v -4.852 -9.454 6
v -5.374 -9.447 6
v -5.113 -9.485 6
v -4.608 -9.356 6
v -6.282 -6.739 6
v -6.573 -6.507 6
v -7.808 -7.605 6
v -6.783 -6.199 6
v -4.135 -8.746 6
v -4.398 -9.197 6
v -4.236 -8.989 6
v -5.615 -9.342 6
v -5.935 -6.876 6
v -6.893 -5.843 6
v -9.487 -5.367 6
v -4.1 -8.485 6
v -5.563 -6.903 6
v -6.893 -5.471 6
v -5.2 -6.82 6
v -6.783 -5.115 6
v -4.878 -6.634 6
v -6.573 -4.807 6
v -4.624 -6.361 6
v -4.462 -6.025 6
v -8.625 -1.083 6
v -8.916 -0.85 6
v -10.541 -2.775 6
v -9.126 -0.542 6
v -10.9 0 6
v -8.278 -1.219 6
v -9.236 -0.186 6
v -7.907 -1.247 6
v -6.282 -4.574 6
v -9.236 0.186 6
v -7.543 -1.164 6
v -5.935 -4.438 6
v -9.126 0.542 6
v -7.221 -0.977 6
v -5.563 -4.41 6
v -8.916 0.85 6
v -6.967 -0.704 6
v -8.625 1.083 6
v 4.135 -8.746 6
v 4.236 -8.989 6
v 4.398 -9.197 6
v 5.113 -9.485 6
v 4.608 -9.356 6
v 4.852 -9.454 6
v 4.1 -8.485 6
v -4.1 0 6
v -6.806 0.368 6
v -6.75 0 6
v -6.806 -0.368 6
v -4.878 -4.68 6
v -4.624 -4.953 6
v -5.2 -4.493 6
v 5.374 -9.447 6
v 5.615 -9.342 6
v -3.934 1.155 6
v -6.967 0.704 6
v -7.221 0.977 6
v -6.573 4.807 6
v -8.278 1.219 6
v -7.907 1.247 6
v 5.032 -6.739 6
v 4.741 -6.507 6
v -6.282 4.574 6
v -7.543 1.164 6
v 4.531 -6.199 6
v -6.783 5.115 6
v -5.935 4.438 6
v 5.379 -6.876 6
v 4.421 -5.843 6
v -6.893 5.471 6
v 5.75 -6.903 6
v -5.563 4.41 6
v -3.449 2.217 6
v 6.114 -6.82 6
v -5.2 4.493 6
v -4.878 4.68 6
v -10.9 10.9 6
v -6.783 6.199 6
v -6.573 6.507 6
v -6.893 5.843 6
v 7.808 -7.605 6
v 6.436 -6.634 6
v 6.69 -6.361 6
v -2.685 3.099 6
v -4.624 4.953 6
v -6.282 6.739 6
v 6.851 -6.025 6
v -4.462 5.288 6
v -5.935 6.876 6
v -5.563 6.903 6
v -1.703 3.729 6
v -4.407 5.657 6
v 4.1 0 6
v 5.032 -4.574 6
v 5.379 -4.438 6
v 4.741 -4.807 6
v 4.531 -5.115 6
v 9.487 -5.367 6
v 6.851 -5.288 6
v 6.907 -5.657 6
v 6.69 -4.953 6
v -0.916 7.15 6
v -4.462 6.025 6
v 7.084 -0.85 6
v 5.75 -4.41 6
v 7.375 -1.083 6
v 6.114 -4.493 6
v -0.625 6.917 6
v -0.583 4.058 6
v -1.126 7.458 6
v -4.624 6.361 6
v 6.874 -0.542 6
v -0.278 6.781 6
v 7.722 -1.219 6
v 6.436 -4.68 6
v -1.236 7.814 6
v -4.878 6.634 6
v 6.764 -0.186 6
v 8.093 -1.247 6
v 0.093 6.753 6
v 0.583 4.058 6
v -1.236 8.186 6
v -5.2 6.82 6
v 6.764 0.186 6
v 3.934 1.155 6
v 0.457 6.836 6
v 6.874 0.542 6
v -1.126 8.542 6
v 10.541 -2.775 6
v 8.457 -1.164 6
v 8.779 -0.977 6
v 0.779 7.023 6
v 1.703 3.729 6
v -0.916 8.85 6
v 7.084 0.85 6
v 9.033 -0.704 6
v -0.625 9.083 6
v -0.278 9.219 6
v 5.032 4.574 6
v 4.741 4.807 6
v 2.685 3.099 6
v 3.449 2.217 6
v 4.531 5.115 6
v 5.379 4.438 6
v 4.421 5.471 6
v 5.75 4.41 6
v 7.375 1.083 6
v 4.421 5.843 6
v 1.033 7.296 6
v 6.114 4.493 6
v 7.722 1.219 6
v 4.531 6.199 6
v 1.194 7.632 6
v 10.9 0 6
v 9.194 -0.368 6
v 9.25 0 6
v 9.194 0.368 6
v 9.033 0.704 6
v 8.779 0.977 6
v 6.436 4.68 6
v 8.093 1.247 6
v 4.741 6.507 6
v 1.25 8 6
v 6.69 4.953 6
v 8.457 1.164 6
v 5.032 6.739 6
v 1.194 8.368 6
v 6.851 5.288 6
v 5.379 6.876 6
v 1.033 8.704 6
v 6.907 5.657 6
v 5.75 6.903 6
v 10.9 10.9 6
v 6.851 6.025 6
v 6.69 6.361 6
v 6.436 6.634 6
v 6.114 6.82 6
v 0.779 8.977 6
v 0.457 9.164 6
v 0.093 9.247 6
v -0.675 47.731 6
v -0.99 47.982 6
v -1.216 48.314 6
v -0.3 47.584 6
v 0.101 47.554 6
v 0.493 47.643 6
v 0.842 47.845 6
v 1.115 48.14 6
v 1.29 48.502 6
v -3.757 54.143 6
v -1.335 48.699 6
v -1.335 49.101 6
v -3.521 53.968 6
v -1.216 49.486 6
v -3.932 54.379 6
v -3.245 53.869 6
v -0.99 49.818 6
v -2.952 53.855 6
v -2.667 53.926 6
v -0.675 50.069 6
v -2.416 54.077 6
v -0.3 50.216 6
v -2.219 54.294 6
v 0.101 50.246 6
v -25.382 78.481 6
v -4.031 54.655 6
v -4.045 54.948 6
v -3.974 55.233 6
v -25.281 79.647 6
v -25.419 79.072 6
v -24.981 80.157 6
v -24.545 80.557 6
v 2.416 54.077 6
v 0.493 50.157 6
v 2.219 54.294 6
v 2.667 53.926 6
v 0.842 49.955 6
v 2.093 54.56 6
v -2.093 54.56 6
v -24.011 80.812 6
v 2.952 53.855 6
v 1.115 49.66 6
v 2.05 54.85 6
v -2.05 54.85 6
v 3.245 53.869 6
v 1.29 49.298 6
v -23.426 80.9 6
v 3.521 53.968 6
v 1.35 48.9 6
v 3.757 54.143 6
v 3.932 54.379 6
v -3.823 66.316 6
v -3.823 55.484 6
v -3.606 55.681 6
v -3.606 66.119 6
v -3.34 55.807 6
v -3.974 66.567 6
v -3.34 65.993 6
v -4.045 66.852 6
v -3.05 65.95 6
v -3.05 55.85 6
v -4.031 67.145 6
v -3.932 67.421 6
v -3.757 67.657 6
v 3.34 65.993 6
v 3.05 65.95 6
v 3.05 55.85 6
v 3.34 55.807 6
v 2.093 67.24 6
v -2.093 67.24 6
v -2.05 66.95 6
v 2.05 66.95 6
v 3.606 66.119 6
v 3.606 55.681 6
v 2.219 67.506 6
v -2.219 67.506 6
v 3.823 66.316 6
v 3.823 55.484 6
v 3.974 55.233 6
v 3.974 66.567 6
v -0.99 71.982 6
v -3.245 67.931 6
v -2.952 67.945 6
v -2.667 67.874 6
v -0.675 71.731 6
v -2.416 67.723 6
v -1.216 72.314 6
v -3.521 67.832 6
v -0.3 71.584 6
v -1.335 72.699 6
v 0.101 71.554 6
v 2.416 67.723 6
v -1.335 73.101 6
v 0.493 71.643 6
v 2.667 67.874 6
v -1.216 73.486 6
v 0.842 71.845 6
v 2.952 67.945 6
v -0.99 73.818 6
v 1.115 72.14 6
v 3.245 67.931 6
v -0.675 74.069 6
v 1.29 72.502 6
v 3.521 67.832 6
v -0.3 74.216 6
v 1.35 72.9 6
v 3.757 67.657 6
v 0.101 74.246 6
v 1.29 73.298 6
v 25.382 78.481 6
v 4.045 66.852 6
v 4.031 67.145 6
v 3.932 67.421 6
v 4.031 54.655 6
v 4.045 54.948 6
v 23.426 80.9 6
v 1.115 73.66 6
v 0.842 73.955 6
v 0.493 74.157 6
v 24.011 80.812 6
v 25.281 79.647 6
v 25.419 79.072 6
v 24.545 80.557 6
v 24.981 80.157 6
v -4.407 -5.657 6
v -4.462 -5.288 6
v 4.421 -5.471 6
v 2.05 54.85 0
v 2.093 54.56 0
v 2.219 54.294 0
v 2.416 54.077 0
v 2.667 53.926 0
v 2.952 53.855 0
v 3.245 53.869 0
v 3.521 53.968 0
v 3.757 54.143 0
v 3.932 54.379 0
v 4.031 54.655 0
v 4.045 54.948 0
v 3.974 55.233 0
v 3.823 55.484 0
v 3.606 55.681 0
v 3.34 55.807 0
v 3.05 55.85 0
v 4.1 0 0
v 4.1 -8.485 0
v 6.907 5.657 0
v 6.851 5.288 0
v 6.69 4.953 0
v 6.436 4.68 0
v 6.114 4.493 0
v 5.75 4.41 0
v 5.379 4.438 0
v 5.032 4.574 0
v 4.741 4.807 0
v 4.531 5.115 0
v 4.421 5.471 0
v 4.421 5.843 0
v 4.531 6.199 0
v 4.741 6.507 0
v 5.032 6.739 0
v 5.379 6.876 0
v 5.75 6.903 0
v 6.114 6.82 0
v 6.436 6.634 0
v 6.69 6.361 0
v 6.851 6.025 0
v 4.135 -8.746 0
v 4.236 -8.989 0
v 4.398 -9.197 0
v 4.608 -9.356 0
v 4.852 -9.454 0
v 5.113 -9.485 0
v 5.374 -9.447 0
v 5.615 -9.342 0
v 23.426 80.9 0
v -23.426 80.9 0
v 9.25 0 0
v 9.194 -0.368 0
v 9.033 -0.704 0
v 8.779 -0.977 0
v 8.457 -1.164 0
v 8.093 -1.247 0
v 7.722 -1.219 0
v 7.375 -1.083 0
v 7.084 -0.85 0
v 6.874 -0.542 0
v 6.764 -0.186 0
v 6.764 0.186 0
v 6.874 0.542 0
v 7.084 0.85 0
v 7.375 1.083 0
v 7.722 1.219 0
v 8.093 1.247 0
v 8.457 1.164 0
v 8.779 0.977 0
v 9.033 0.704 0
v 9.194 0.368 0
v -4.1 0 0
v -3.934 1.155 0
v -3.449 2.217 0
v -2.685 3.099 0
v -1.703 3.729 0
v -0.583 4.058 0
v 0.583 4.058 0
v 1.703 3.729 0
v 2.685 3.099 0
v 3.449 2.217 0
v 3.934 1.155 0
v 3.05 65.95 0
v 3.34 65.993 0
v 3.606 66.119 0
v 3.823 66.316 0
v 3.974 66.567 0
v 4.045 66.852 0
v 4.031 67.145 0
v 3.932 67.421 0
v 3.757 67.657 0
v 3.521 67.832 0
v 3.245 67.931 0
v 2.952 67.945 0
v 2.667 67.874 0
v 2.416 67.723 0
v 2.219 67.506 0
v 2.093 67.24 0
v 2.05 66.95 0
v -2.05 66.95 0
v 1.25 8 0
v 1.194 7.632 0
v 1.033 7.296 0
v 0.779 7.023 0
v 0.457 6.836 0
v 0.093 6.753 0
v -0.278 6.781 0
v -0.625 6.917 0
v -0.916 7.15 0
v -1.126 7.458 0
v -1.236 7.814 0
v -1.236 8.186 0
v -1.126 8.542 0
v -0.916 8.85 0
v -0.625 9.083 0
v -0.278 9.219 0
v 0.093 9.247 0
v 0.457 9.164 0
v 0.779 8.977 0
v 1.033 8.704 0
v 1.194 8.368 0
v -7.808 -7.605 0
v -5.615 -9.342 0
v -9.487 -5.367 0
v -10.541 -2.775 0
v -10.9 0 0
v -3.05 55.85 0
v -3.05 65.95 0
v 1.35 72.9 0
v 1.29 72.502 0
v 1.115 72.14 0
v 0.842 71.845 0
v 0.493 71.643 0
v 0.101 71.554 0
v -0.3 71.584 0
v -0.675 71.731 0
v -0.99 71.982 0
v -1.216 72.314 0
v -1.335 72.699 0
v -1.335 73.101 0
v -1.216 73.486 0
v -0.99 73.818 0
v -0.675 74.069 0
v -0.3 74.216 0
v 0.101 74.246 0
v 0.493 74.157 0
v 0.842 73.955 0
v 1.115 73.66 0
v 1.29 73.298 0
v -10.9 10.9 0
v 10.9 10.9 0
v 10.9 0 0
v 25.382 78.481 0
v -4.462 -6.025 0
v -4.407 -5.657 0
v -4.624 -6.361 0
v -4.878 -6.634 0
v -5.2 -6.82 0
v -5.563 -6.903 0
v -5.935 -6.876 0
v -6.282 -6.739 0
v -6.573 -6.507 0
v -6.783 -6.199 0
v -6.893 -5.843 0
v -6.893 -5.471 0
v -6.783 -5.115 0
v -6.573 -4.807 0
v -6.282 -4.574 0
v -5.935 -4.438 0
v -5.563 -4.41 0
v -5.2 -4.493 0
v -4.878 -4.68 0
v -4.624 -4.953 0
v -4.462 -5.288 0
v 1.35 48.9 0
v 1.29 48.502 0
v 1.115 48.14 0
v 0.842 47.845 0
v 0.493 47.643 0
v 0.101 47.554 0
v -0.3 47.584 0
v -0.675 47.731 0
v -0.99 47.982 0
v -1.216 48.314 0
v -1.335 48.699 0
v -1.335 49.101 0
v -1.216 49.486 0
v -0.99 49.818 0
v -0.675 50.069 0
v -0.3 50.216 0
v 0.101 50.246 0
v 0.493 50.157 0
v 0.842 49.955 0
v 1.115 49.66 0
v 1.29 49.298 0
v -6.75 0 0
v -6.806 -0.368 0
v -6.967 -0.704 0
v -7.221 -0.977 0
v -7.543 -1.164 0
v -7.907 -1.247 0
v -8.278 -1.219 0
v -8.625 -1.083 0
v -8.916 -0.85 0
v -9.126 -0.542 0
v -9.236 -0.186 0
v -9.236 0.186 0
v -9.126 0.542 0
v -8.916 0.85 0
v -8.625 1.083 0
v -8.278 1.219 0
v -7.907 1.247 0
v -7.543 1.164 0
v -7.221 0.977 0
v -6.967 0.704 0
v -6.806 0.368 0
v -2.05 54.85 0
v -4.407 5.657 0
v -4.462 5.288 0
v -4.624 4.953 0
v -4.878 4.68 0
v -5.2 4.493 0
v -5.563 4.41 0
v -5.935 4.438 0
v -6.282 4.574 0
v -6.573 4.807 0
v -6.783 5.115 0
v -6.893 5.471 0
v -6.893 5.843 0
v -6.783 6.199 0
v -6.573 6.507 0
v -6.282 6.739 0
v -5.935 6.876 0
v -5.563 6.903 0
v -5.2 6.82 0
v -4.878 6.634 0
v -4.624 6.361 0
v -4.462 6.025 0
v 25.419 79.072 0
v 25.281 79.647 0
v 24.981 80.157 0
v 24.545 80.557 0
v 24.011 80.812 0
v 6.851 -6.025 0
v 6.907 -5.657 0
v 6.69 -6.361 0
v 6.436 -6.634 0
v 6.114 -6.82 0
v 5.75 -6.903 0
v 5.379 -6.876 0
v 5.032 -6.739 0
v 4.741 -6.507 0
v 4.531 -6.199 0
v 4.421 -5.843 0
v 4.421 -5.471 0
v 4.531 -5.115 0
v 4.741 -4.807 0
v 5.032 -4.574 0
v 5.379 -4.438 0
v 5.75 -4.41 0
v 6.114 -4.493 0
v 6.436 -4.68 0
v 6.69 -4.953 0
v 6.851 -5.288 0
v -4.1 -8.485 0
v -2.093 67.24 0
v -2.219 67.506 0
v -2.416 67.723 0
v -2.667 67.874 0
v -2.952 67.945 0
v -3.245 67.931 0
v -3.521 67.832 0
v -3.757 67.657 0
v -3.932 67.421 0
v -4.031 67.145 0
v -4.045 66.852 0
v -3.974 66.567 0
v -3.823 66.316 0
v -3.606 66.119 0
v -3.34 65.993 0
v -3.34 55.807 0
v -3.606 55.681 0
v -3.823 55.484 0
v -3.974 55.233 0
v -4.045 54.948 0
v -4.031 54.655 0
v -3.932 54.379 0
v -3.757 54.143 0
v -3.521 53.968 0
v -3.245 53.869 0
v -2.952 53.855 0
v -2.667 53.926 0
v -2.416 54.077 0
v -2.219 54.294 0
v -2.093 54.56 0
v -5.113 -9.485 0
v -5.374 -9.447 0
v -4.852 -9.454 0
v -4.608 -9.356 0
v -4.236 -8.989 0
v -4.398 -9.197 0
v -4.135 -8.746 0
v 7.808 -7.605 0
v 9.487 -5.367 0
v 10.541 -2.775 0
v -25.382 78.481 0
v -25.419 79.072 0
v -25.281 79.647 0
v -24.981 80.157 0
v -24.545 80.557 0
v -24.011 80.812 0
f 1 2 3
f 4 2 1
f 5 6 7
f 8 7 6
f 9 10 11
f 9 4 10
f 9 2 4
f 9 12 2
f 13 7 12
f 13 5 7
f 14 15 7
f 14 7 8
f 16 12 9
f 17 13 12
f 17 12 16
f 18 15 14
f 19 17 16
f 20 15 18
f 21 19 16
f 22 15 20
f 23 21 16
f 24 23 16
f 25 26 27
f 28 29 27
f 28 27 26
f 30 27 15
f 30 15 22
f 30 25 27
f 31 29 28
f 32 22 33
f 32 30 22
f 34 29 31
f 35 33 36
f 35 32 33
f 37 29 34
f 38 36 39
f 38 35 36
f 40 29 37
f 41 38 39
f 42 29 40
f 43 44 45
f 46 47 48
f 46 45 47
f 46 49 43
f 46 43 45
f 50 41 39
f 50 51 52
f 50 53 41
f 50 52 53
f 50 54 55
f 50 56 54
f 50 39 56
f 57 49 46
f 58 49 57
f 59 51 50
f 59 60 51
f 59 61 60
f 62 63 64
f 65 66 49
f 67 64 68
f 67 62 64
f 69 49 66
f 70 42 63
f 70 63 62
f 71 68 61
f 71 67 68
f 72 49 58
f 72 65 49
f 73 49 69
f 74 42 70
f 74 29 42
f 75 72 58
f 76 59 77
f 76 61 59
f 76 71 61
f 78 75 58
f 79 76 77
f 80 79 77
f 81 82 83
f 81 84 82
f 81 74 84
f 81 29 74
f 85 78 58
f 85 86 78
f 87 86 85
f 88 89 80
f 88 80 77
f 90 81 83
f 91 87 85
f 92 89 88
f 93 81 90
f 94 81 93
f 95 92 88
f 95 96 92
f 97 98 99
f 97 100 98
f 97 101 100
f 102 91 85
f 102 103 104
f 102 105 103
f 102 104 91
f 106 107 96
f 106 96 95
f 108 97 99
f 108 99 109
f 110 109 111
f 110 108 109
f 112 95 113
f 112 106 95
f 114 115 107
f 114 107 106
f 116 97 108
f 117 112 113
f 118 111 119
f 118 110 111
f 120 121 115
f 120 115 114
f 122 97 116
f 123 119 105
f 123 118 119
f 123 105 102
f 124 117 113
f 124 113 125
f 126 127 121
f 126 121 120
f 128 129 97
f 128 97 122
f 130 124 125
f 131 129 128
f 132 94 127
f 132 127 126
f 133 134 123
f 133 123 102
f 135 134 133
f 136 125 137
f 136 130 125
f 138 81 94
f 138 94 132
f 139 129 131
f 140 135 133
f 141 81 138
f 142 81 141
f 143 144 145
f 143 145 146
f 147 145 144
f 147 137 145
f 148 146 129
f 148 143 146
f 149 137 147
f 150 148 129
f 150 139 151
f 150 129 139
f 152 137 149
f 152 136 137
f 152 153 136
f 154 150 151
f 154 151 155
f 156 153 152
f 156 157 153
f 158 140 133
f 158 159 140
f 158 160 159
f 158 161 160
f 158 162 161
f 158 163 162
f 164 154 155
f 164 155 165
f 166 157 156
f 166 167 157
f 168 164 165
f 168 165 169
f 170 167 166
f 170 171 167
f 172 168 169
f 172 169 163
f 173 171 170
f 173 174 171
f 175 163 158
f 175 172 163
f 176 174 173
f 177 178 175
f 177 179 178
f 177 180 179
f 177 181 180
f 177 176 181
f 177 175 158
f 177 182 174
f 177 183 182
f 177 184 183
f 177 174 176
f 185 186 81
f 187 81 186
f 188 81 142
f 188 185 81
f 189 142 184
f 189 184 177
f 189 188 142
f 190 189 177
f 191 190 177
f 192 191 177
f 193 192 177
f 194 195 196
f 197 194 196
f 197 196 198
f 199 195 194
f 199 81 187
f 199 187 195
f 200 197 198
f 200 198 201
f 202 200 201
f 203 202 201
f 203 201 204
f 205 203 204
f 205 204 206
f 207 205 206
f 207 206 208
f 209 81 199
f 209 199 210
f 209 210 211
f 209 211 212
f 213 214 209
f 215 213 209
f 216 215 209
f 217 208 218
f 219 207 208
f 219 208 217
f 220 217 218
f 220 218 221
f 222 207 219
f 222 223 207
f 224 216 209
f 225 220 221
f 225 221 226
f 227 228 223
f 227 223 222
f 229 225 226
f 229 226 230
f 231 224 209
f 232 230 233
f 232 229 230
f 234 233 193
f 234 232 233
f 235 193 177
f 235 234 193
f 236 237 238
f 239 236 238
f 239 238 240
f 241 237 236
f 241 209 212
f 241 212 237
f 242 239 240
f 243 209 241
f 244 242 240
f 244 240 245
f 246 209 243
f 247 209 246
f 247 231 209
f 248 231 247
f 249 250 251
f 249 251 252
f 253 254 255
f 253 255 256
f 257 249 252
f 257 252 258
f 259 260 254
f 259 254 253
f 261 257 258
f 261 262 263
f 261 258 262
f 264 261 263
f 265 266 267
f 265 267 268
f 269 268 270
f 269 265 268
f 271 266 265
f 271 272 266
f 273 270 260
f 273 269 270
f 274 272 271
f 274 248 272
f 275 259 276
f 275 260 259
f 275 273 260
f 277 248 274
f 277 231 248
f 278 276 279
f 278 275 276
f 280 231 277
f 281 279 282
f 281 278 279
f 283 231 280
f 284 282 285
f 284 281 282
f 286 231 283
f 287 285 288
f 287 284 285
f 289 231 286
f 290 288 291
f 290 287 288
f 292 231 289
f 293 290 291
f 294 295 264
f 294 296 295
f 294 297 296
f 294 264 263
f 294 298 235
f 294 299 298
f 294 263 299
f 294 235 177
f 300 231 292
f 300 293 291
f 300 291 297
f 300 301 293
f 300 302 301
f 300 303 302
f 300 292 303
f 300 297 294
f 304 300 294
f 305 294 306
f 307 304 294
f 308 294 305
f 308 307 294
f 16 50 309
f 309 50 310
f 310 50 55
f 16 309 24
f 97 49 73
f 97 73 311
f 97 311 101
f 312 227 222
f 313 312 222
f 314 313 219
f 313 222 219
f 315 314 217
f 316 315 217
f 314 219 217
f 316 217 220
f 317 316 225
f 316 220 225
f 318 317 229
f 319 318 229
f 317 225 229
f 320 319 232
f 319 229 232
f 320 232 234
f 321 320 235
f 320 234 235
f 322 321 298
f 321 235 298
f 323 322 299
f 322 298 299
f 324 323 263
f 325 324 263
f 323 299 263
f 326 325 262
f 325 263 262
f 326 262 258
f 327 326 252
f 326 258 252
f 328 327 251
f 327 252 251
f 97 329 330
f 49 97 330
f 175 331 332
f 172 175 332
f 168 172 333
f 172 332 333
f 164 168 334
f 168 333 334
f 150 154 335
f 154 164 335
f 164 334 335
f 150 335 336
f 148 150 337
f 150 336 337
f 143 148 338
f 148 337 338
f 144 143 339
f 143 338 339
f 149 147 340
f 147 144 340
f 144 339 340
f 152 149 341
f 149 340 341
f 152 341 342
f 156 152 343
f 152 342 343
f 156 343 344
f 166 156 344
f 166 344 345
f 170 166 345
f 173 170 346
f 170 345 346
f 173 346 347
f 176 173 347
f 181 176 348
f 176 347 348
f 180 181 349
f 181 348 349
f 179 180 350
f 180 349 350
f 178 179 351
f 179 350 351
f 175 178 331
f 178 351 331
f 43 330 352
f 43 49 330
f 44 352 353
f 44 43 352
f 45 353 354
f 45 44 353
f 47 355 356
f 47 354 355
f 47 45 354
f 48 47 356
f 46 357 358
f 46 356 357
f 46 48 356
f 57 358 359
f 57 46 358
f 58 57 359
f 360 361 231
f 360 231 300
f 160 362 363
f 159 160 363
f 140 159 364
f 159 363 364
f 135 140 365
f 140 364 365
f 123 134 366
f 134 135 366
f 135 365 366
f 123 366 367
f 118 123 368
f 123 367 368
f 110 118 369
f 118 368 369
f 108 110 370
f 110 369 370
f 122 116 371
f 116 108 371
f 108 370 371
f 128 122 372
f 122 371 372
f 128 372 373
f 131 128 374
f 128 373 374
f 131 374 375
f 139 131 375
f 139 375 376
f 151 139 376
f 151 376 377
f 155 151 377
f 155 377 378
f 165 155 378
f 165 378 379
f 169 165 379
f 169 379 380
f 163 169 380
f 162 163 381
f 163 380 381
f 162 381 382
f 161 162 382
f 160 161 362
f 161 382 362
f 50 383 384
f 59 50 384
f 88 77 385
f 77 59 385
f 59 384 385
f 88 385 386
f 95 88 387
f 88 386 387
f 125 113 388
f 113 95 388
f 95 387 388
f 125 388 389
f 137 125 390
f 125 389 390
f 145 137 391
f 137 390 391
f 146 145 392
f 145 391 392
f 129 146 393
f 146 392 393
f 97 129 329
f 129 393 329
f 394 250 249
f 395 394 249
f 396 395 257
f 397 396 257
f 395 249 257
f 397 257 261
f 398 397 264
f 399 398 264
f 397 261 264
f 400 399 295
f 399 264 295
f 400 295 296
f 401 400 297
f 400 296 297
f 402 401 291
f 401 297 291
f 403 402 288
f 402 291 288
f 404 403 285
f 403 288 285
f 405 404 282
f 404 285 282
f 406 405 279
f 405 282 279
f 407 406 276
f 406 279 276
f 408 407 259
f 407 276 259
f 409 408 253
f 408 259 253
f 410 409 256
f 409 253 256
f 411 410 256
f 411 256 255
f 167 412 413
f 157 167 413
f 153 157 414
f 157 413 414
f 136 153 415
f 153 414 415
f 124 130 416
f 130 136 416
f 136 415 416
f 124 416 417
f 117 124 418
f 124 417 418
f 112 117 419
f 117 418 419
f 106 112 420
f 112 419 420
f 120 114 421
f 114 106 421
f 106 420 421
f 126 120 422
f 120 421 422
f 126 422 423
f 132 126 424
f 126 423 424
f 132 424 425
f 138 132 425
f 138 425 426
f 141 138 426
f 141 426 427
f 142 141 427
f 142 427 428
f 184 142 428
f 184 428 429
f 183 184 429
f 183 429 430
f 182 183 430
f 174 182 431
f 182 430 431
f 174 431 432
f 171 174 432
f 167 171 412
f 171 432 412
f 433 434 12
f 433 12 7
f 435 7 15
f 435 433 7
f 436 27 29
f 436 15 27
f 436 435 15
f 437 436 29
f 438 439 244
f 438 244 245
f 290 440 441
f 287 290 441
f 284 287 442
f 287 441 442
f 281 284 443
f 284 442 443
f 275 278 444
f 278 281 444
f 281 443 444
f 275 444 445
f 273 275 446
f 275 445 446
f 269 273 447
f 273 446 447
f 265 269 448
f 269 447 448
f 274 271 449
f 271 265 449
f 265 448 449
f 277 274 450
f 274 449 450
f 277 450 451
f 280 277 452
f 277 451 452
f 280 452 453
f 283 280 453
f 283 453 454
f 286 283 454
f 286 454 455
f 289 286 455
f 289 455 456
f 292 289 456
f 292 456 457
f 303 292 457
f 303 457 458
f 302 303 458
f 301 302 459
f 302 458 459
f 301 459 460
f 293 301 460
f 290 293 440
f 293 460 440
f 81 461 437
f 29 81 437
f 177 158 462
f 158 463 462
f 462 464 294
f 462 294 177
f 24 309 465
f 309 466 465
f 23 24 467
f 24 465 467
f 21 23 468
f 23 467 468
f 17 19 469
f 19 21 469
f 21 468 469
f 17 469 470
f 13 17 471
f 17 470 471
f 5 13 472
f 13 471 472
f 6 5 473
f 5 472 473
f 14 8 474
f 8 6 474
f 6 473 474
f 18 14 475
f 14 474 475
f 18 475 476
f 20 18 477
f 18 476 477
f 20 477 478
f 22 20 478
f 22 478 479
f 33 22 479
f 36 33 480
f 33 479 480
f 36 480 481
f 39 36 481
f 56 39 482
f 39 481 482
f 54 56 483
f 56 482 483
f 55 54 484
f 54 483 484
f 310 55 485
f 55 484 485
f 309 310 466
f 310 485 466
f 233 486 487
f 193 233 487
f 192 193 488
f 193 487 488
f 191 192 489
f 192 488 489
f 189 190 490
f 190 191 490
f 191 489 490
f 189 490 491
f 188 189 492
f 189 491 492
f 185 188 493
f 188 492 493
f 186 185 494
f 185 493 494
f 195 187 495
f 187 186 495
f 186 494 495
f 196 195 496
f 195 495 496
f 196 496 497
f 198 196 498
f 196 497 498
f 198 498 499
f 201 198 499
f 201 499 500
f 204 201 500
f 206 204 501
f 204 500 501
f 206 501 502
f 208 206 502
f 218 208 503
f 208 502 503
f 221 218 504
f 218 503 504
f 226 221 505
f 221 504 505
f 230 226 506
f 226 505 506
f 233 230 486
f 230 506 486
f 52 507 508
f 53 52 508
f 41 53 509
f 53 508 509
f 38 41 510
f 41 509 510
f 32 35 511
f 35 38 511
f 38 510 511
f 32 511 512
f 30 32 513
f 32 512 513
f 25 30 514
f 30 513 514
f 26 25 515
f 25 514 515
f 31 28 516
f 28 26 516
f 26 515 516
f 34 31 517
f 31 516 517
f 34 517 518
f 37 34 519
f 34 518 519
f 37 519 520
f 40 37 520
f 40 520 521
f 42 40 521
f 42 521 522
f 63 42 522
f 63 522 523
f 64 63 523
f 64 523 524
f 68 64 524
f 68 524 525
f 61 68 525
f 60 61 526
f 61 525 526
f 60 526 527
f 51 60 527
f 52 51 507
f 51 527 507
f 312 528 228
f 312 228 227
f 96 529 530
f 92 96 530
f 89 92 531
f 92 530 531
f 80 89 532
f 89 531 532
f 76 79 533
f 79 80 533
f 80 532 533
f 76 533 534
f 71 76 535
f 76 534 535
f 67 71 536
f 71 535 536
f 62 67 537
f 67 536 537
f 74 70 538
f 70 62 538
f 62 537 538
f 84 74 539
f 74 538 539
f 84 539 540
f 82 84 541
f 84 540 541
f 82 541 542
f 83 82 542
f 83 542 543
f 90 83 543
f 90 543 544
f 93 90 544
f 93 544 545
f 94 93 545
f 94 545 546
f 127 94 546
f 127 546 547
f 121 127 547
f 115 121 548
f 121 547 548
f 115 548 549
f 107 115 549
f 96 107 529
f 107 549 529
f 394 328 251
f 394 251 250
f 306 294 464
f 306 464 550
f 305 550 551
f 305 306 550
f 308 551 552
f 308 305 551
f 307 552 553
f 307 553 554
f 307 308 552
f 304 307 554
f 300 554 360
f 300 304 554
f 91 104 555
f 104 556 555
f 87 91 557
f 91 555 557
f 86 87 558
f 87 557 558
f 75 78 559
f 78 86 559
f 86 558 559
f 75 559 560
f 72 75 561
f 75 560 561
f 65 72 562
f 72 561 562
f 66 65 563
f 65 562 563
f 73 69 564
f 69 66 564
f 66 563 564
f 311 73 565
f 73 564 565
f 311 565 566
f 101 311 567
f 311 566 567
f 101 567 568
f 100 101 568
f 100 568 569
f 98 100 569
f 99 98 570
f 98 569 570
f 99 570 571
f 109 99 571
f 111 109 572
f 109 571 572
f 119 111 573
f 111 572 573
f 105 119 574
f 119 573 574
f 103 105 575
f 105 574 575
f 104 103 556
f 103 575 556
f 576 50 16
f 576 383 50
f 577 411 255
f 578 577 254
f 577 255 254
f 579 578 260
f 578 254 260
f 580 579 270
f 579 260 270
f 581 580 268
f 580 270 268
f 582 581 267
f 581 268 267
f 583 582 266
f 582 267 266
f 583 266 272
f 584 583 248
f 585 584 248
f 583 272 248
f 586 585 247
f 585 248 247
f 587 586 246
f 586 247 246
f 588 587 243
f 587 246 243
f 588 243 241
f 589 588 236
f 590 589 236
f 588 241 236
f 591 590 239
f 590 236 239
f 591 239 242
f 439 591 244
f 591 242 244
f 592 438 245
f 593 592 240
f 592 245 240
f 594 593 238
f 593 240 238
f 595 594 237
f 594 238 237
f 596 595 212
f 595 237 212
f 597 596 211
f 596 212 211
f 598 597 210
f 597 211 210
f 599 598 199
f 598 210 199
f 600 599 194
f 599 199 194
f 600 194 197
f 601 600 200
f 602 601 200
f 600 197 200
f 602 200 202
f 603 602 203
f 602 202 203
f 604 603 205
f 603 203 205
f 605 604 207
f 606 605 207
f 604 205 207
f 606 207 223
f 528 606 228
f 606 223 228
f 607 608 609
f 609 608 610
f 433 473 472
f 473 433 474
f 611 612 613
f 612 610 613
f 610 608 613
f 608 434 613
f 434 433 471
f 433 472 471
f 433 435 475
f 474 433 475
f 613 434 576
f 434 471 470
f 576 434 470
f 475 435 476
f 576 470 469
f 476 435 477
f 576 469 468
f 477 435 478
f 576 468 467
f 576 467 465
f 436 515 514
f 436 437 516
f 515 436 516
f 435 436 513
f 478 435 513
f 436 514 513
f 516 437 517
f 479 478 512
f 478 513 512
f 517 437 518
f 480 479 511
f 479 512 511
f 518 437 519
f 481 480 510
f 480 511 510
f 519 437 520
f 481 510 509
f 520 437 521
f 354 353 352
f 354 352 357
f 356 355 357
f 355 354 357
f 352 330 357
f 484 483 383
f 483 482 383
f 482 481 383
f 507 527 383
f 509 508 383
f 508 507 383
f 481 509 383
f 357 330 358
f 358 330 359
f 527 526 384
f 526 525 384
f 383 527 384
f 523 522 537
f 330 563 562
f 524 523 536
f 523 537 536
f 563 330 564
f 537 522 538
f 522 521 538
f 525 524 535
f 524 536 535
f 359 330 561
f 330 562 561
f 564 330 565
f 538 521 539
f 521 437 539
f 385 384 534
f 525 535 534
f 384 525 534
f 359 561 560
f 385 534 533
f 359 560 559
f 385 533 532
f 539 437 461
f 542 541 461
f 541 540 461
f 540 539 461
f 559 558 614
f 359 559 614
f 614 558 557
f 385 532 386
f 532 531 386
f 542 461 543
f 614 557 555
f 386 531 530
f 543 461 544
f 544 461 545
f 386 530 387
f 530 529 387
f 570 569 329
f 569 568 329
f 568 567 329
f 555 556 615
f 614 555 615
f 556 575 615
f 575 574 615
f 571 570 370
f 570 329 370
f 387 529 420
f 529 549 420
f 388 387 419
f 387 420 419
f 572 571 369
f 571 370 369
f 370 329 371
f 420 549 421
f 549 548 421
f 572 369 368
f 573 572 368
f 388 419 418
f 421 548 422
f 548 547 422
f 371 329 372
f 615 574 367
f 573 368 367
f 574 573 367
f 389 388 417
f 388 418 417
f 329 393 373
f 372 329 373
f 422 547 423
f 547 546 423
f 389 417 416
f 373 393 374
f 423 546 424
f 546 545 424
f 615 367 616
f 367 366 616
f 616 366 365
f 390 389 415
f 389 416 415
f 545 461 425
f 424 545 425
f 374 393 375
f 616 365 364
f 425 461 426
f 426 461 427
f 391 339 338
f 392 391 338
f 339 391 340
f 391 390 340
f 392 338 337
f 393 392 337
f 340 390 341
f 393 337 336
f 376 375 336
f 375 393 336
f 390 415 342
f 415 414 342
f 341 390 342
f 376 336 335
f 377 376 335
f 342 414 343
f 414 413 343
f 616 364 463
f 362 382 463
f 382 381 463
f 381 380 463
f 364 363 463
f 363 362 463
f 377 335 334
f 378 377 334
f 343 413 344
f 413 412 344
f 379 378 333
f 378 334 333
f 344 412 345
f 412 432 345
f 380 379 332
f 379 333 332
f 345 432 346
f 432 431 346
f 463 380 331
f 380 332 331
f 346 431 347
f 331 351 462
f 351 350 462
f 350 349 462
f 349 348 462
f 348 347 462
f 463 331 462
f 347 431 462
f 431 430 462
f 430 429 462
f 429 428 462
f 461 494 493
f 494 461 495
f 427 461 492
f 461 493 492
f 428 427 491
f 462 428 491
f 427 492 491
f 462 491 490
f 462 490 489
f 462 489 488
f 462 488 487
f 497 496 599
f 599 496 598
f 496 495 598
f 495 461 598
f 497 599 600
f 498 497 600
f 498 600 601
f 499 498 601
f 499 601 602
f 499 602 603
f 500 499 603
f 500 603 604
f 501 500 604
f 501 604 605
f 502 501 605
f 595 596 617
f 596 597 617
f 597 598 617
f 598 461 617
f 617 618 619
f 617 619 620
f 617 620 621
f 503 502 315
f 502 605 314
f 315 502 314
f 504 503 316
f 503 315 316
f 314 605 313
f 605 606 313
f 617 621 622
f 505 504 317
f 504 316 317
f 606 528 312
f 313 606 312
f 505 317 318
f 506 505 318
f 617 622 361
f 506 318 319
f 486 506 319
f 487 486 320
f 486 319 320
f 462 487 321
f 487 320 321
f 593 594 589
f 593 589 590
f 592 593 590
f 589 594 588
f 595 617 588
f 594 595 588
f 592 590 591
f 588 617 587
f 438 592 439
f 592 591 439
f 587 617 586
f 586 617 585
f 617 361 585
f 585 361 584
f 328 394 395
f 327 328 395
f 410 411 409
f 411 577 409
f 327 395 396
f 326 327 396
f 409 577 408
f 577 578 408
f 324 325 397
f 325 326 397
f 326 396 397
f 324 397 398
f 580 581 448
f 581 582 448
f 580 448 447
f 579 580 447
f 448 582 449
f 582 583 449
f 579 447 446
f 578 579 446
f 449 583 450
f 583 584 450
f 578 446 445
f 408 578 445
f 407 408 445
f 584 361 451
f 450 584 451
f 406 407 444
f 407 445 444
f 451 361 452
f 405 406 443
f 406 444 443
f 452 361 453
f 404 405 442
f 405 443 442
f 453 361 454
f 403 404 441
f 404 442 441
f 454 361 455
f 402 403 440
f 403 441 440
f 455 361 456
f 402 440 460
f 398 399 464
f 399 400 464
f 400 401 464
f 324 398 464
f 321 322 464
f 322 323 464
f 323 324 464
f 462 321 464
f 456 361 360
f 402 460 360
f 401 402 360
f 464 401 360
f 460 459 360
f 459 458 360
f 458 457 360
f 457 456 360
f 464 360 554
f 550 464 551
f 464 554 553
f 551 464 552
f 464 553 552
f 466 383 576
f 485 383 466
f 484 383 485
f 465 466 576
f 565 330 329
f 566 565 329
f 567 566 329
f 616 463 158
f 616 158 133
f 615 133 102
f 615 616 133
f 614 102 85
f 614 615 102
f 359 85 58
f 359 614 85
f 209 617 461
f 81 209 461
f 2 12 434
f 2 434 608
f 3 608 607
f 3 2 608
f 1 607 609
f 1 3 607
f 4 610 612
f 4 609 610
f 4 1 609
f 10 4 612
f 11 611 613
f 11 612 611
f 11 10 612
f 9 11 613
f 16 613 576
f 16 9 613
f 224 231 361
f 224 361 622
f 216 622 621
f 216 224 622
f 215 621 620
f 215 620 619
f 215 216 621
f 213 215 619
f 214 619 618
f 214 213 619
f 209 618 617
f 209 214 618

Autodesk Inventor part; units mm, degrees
ref_plane "YZ Plane" through (0, 0, 0) normal (1, 0, 0) x (0, 1, 0)
ref_plane "XZ Plane" through (0, 0, 0) normal (0, 1, 0) x (-1, 0, 0)
ref_plane "XY Plane" through (0, 0, 0) normal (0, 0, 1) x (1, 0, 0)
ref_plane "작업 평면1" through (0, 0, 0) normal (0, 0, 1) x (1, 0, 0)
sketch "스케치1" plane through (0, 0, 0) normal (0, 0, 1) x (1, 0, 0)
  circle A0 centre (-5.6569, -5.6569) radius 1.2 projected
  circle A1 centre (5.6569, -5.6569) radius 1.2 projected
  circle A2 centre (5.6569, 5.6569) radius 1.2 projected
  circle A3 centre (-5.6569, 5.6569) radius 1.2 projected
  circle A4 centre (0, 0) radius 4 projected
  circle A5 centre (0, 0) radius 10.9 projected
  circle A6 centre (0, 8) radius 1.2 projected
  circle A7 centre (8, 0) radius 1.2 projected
  circle A8 centre (0, -8) radius 1.2 projected
  circle A9 centre (-8, 0) radius 1.2 projected
  line L0 (10.9, 0) -> (10.9, 10.9)
  line L1 (10.9, 10.9) -> (-10.9, 10.9)
  line L2 (-10.9, 10.9) -> (-10.9, 0)
  line L3 (-10.9, 10.9) -> (10.9, 10.9)
  line L4 (10.9, 80.9) -> (-10.9, 80.9)
  line L5 (10.9, 80.9) -> (25.9, 80.9)
  line L6 (25.9, 80.9) -> (10.9, 10.9)
  line L7 (-10.9, 80.9) -> (-25.9, 80.9)
  line L8 (-25.9, 80.9) -> (-10.9, 10.9)
  circle A10 centre (0, 72.9) radius 1.35
  circle A11 centre (0, 48.9) radius 1.35
  line L9 (-3.05, 54.85) -> (3.05, 54.85)
  line L10 (3.05, 54.85) -> (3.05, 66.95)
  line L11 (3.05, 66.95) -> (-3.05, 66.95)
  line L12 (-3.05, 66.95) -> (-3.05, 54.85)
  line L13 (-3.05, 54.85) -> (3.05, 66.95) construction
  line L14 (3.05, 54.85) -> (-3.05, 66.95) construction
  circle A12 centre (0, 0) radius 4.1
  circle A13 centre (5.6569, 5.6569) radius 1.25
  circle A14 centre (0, 8) radius 1.25
  circle A15 centre (-5.6569, 5.6569) radius 1.25
  circle A16 centre (-8, 0) radius 1.25
  circle A17 centre (-5.6569, -5.6569) radius 1.25
  circle A18 centre (0, -8) radius 1.25
  circle A19 centre (5.6569, -5.6569) radius 1.25
  circle A20 centre (8, 0) radius 1.25
  circle A21 centre (0, 0) radius 10.9
  line L15 (-4.1, 0) -> (-4.1, -10.0995)
  line L16 (4.1, 0) -> (4.1, -10.0995)
  point P0 (0, 0)
  point P1 (0, 60.9)
  dimension "d22" = 2.7
  dimension "d23" = 2.7
  dimension "d28" = 6.1
  dimension "d29" = 12.1
  dimension "d33" = 2.5
  dimension "d36" = 360
extrude "돌출6" add sketch "스케치1" along normal blind 6 contours A5 L16 A12 L15 | L2 L1 A5 | L1 L0 A5 | L1 L8 L7 L4 L5 L6 picked at (-5.5569, -1.7483)
fillet "모깎기2" radius 1 2 edges at (4.1, -10.0995, 3) (-4.1, -10.0995, 3)
fillet "모깎기3" radius 2 2 edges at (25.9, 80.9, 3) (-25.9, 80.9, 3)
sketch "스케치2" plane through (0, 0, 6) normal (0, 0, 1) x (1, 0, 0)
  line L0 (3.05, 66.95) -> (3.05, 54.85) projected
  line L1 (-3.05, 54.85) -> (-3.05, 66.95) projected
  line L2 (-3.05, 66.95) -> (3.05, 66.95) projected
  line L3 (3.05, 54.85) -> (-3.05, 54.85) projected
  circle A0 centre (3.05, 66.95) radius 1
  circle A1 centre (-3.05, 66.95) radius 1
  circle A2 centre (-3.05, 54.85) radius 1
  circle A3 centre (3.05, 54.85) radius 1
  point P0 (0, 0)
  dimension "d42" = 2
  dimension "d43" = 2
  dimension "d44" = 2
  dimension "d45" = 2
extrude "돌출7" cut sketch "스케치2" against normal blind 10 contours L2 A0 L0 | L0 A0 L2 | A3 L3 L0 | L0 L3 A3 | A1 L1 L2 | L2 L1 A1 | A2 L1 L3 | L3 L1 A2
properties part number "hand" material "PMMA 플라스틱"
